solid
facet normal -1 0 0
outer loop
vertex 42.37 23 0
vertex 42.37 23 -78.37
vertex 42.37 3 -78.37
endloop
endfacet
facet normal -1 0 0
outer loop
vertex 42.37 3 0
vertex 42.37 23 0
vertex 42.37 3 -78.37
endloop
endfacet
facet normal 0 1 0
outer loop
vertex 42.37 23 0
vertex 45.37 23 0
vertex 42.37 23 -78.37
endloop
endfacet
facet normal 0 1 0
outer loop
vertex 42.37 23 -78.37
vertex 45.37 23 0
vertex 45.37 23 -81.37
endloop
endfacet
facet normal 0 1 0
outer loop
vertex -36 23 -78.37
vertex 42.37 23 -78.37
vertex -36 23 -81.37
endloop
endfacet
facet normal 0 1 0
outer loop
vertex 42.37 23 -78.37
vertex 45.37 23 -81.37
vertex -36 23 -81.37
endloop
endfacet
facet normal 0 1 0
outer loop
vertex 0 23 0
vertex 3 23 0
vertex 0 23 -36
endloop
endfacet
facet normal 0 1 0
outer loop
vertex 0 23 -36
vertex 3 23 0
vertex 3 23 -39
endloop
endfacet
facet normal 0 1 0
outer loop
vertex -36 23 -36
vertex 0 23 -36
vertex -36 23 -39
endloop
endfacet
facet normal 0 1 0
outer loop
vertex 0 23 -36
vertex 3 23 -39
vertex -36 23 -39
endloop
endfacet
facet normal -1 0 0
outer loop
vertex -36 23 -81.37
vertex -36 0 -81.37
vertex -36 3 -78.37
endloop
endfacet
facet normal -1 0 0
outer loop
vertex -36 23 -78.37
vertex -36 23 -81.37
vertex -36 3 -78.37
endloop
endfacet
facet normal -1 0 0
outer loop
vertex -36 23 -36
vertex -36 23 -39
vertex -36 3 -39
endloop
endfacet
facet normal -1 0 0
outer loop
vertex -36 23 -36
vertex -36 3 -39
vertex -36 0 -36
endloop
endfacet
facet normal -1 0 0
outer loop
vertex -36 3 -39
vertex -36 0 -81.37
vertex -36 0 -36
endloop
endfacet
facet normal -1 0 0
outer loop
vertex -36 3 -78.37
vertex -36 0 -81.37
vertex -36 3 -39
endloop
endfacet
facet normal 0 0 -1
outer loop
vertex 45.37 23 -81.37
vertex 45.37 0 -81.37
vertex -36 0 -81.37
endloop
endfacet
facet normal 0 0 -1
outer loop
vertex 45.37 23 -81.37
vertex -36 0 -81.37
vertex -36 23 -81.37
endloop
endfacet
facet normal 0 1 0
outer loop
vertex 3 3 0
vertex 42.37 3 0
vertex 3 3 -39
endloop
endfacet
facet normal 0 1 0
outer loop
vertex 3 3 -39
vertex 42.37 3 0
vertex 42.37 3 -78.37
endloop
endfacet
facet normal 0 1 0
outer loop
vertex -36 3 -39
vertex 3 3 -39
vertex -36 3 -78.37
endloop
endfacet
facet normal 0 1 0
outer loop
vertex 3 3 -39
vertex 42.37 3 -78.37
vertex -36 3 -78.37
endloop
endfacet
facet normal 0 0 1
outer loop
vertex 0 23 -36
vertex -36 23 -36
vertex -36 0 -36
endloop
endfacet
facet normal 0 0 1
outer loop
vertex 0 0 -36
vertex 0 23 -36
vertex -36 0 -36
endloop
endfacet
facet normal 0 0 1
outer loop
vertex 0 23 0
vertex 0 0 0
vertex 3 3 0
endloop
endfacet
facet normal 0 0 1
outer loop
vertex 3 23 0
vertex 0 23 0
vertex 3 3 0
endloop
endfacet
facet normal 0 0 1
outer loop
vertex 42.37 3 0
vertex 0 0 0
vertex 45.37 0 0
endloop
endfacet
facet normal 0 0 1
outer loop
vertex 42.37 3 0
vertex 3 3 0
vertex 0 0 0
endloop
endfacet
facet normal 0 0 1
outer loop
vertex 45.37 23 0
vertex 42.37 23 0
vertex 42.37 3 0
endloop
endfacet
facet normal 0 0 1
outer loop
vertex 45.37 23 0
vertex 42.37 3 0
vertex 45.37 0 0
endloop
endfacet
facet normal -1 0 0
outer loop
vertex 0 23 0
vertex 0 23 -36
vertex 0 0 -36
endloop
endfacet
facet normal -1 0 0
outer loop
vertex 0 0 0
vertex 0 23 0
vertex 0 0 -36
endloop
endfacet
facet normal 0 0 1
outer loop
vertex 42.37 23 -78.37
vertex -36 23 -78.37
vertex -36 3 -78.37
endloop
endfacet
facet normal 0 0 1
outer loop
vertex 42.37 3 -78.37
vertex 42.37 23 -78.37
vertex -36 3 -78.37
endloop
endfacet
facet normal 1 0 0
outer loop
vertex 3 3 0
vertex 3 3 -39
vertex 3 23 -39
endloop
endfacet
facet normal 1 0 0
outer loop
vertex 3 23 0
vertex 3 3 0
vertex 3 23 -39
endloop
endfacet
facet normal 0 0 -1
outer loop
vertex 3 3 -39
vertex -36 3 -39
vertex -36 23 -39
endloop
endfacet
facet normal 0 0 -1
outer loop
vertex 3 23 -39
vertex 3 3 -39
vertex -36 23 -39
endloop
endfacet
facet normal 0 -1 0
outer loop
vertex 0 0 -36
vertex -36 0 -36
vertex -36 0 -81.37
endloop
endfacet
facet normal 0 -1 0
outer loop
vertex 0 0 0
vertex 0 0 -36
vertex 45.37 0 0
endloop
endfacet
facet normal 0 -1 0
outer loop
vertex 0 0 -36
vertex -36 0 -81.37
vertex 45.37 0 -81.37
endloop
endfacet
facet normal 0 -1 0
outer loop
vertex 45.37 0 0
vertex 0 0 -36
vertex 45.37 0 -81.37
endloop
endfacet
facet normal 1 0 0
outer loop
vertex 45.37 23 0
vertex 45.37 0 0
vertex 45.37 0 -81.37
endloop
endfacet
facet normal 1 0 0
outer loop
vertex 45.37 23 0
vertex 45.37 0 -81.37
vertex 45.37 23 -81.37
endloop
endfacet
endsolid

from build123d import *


with BuildPart() as part:
    # Sweep1: sweep along a path in Sketch1
    with BuildLine(Plane(origin=(0, 0, 0), x_dir=(1, 0, 0), z_dir=(0, 1, 0))) as sweep1_path:
        Line((0, 0), (0, 36))
        Line((0, 36), (-36, 36))
    # Sketch2 → Sweep1 (sweep)
    with BuildSketch(Plane.XY):
        Polygon((0, 0), (0, 23), (3, 23), (3, 3), (42.37, 3), (42.37, 23), (45.37, 23), (45.37, 0), align=None)
    sweep(path=sweep1_path.line, transition=Transition.RIGHT)


solid = part.part
